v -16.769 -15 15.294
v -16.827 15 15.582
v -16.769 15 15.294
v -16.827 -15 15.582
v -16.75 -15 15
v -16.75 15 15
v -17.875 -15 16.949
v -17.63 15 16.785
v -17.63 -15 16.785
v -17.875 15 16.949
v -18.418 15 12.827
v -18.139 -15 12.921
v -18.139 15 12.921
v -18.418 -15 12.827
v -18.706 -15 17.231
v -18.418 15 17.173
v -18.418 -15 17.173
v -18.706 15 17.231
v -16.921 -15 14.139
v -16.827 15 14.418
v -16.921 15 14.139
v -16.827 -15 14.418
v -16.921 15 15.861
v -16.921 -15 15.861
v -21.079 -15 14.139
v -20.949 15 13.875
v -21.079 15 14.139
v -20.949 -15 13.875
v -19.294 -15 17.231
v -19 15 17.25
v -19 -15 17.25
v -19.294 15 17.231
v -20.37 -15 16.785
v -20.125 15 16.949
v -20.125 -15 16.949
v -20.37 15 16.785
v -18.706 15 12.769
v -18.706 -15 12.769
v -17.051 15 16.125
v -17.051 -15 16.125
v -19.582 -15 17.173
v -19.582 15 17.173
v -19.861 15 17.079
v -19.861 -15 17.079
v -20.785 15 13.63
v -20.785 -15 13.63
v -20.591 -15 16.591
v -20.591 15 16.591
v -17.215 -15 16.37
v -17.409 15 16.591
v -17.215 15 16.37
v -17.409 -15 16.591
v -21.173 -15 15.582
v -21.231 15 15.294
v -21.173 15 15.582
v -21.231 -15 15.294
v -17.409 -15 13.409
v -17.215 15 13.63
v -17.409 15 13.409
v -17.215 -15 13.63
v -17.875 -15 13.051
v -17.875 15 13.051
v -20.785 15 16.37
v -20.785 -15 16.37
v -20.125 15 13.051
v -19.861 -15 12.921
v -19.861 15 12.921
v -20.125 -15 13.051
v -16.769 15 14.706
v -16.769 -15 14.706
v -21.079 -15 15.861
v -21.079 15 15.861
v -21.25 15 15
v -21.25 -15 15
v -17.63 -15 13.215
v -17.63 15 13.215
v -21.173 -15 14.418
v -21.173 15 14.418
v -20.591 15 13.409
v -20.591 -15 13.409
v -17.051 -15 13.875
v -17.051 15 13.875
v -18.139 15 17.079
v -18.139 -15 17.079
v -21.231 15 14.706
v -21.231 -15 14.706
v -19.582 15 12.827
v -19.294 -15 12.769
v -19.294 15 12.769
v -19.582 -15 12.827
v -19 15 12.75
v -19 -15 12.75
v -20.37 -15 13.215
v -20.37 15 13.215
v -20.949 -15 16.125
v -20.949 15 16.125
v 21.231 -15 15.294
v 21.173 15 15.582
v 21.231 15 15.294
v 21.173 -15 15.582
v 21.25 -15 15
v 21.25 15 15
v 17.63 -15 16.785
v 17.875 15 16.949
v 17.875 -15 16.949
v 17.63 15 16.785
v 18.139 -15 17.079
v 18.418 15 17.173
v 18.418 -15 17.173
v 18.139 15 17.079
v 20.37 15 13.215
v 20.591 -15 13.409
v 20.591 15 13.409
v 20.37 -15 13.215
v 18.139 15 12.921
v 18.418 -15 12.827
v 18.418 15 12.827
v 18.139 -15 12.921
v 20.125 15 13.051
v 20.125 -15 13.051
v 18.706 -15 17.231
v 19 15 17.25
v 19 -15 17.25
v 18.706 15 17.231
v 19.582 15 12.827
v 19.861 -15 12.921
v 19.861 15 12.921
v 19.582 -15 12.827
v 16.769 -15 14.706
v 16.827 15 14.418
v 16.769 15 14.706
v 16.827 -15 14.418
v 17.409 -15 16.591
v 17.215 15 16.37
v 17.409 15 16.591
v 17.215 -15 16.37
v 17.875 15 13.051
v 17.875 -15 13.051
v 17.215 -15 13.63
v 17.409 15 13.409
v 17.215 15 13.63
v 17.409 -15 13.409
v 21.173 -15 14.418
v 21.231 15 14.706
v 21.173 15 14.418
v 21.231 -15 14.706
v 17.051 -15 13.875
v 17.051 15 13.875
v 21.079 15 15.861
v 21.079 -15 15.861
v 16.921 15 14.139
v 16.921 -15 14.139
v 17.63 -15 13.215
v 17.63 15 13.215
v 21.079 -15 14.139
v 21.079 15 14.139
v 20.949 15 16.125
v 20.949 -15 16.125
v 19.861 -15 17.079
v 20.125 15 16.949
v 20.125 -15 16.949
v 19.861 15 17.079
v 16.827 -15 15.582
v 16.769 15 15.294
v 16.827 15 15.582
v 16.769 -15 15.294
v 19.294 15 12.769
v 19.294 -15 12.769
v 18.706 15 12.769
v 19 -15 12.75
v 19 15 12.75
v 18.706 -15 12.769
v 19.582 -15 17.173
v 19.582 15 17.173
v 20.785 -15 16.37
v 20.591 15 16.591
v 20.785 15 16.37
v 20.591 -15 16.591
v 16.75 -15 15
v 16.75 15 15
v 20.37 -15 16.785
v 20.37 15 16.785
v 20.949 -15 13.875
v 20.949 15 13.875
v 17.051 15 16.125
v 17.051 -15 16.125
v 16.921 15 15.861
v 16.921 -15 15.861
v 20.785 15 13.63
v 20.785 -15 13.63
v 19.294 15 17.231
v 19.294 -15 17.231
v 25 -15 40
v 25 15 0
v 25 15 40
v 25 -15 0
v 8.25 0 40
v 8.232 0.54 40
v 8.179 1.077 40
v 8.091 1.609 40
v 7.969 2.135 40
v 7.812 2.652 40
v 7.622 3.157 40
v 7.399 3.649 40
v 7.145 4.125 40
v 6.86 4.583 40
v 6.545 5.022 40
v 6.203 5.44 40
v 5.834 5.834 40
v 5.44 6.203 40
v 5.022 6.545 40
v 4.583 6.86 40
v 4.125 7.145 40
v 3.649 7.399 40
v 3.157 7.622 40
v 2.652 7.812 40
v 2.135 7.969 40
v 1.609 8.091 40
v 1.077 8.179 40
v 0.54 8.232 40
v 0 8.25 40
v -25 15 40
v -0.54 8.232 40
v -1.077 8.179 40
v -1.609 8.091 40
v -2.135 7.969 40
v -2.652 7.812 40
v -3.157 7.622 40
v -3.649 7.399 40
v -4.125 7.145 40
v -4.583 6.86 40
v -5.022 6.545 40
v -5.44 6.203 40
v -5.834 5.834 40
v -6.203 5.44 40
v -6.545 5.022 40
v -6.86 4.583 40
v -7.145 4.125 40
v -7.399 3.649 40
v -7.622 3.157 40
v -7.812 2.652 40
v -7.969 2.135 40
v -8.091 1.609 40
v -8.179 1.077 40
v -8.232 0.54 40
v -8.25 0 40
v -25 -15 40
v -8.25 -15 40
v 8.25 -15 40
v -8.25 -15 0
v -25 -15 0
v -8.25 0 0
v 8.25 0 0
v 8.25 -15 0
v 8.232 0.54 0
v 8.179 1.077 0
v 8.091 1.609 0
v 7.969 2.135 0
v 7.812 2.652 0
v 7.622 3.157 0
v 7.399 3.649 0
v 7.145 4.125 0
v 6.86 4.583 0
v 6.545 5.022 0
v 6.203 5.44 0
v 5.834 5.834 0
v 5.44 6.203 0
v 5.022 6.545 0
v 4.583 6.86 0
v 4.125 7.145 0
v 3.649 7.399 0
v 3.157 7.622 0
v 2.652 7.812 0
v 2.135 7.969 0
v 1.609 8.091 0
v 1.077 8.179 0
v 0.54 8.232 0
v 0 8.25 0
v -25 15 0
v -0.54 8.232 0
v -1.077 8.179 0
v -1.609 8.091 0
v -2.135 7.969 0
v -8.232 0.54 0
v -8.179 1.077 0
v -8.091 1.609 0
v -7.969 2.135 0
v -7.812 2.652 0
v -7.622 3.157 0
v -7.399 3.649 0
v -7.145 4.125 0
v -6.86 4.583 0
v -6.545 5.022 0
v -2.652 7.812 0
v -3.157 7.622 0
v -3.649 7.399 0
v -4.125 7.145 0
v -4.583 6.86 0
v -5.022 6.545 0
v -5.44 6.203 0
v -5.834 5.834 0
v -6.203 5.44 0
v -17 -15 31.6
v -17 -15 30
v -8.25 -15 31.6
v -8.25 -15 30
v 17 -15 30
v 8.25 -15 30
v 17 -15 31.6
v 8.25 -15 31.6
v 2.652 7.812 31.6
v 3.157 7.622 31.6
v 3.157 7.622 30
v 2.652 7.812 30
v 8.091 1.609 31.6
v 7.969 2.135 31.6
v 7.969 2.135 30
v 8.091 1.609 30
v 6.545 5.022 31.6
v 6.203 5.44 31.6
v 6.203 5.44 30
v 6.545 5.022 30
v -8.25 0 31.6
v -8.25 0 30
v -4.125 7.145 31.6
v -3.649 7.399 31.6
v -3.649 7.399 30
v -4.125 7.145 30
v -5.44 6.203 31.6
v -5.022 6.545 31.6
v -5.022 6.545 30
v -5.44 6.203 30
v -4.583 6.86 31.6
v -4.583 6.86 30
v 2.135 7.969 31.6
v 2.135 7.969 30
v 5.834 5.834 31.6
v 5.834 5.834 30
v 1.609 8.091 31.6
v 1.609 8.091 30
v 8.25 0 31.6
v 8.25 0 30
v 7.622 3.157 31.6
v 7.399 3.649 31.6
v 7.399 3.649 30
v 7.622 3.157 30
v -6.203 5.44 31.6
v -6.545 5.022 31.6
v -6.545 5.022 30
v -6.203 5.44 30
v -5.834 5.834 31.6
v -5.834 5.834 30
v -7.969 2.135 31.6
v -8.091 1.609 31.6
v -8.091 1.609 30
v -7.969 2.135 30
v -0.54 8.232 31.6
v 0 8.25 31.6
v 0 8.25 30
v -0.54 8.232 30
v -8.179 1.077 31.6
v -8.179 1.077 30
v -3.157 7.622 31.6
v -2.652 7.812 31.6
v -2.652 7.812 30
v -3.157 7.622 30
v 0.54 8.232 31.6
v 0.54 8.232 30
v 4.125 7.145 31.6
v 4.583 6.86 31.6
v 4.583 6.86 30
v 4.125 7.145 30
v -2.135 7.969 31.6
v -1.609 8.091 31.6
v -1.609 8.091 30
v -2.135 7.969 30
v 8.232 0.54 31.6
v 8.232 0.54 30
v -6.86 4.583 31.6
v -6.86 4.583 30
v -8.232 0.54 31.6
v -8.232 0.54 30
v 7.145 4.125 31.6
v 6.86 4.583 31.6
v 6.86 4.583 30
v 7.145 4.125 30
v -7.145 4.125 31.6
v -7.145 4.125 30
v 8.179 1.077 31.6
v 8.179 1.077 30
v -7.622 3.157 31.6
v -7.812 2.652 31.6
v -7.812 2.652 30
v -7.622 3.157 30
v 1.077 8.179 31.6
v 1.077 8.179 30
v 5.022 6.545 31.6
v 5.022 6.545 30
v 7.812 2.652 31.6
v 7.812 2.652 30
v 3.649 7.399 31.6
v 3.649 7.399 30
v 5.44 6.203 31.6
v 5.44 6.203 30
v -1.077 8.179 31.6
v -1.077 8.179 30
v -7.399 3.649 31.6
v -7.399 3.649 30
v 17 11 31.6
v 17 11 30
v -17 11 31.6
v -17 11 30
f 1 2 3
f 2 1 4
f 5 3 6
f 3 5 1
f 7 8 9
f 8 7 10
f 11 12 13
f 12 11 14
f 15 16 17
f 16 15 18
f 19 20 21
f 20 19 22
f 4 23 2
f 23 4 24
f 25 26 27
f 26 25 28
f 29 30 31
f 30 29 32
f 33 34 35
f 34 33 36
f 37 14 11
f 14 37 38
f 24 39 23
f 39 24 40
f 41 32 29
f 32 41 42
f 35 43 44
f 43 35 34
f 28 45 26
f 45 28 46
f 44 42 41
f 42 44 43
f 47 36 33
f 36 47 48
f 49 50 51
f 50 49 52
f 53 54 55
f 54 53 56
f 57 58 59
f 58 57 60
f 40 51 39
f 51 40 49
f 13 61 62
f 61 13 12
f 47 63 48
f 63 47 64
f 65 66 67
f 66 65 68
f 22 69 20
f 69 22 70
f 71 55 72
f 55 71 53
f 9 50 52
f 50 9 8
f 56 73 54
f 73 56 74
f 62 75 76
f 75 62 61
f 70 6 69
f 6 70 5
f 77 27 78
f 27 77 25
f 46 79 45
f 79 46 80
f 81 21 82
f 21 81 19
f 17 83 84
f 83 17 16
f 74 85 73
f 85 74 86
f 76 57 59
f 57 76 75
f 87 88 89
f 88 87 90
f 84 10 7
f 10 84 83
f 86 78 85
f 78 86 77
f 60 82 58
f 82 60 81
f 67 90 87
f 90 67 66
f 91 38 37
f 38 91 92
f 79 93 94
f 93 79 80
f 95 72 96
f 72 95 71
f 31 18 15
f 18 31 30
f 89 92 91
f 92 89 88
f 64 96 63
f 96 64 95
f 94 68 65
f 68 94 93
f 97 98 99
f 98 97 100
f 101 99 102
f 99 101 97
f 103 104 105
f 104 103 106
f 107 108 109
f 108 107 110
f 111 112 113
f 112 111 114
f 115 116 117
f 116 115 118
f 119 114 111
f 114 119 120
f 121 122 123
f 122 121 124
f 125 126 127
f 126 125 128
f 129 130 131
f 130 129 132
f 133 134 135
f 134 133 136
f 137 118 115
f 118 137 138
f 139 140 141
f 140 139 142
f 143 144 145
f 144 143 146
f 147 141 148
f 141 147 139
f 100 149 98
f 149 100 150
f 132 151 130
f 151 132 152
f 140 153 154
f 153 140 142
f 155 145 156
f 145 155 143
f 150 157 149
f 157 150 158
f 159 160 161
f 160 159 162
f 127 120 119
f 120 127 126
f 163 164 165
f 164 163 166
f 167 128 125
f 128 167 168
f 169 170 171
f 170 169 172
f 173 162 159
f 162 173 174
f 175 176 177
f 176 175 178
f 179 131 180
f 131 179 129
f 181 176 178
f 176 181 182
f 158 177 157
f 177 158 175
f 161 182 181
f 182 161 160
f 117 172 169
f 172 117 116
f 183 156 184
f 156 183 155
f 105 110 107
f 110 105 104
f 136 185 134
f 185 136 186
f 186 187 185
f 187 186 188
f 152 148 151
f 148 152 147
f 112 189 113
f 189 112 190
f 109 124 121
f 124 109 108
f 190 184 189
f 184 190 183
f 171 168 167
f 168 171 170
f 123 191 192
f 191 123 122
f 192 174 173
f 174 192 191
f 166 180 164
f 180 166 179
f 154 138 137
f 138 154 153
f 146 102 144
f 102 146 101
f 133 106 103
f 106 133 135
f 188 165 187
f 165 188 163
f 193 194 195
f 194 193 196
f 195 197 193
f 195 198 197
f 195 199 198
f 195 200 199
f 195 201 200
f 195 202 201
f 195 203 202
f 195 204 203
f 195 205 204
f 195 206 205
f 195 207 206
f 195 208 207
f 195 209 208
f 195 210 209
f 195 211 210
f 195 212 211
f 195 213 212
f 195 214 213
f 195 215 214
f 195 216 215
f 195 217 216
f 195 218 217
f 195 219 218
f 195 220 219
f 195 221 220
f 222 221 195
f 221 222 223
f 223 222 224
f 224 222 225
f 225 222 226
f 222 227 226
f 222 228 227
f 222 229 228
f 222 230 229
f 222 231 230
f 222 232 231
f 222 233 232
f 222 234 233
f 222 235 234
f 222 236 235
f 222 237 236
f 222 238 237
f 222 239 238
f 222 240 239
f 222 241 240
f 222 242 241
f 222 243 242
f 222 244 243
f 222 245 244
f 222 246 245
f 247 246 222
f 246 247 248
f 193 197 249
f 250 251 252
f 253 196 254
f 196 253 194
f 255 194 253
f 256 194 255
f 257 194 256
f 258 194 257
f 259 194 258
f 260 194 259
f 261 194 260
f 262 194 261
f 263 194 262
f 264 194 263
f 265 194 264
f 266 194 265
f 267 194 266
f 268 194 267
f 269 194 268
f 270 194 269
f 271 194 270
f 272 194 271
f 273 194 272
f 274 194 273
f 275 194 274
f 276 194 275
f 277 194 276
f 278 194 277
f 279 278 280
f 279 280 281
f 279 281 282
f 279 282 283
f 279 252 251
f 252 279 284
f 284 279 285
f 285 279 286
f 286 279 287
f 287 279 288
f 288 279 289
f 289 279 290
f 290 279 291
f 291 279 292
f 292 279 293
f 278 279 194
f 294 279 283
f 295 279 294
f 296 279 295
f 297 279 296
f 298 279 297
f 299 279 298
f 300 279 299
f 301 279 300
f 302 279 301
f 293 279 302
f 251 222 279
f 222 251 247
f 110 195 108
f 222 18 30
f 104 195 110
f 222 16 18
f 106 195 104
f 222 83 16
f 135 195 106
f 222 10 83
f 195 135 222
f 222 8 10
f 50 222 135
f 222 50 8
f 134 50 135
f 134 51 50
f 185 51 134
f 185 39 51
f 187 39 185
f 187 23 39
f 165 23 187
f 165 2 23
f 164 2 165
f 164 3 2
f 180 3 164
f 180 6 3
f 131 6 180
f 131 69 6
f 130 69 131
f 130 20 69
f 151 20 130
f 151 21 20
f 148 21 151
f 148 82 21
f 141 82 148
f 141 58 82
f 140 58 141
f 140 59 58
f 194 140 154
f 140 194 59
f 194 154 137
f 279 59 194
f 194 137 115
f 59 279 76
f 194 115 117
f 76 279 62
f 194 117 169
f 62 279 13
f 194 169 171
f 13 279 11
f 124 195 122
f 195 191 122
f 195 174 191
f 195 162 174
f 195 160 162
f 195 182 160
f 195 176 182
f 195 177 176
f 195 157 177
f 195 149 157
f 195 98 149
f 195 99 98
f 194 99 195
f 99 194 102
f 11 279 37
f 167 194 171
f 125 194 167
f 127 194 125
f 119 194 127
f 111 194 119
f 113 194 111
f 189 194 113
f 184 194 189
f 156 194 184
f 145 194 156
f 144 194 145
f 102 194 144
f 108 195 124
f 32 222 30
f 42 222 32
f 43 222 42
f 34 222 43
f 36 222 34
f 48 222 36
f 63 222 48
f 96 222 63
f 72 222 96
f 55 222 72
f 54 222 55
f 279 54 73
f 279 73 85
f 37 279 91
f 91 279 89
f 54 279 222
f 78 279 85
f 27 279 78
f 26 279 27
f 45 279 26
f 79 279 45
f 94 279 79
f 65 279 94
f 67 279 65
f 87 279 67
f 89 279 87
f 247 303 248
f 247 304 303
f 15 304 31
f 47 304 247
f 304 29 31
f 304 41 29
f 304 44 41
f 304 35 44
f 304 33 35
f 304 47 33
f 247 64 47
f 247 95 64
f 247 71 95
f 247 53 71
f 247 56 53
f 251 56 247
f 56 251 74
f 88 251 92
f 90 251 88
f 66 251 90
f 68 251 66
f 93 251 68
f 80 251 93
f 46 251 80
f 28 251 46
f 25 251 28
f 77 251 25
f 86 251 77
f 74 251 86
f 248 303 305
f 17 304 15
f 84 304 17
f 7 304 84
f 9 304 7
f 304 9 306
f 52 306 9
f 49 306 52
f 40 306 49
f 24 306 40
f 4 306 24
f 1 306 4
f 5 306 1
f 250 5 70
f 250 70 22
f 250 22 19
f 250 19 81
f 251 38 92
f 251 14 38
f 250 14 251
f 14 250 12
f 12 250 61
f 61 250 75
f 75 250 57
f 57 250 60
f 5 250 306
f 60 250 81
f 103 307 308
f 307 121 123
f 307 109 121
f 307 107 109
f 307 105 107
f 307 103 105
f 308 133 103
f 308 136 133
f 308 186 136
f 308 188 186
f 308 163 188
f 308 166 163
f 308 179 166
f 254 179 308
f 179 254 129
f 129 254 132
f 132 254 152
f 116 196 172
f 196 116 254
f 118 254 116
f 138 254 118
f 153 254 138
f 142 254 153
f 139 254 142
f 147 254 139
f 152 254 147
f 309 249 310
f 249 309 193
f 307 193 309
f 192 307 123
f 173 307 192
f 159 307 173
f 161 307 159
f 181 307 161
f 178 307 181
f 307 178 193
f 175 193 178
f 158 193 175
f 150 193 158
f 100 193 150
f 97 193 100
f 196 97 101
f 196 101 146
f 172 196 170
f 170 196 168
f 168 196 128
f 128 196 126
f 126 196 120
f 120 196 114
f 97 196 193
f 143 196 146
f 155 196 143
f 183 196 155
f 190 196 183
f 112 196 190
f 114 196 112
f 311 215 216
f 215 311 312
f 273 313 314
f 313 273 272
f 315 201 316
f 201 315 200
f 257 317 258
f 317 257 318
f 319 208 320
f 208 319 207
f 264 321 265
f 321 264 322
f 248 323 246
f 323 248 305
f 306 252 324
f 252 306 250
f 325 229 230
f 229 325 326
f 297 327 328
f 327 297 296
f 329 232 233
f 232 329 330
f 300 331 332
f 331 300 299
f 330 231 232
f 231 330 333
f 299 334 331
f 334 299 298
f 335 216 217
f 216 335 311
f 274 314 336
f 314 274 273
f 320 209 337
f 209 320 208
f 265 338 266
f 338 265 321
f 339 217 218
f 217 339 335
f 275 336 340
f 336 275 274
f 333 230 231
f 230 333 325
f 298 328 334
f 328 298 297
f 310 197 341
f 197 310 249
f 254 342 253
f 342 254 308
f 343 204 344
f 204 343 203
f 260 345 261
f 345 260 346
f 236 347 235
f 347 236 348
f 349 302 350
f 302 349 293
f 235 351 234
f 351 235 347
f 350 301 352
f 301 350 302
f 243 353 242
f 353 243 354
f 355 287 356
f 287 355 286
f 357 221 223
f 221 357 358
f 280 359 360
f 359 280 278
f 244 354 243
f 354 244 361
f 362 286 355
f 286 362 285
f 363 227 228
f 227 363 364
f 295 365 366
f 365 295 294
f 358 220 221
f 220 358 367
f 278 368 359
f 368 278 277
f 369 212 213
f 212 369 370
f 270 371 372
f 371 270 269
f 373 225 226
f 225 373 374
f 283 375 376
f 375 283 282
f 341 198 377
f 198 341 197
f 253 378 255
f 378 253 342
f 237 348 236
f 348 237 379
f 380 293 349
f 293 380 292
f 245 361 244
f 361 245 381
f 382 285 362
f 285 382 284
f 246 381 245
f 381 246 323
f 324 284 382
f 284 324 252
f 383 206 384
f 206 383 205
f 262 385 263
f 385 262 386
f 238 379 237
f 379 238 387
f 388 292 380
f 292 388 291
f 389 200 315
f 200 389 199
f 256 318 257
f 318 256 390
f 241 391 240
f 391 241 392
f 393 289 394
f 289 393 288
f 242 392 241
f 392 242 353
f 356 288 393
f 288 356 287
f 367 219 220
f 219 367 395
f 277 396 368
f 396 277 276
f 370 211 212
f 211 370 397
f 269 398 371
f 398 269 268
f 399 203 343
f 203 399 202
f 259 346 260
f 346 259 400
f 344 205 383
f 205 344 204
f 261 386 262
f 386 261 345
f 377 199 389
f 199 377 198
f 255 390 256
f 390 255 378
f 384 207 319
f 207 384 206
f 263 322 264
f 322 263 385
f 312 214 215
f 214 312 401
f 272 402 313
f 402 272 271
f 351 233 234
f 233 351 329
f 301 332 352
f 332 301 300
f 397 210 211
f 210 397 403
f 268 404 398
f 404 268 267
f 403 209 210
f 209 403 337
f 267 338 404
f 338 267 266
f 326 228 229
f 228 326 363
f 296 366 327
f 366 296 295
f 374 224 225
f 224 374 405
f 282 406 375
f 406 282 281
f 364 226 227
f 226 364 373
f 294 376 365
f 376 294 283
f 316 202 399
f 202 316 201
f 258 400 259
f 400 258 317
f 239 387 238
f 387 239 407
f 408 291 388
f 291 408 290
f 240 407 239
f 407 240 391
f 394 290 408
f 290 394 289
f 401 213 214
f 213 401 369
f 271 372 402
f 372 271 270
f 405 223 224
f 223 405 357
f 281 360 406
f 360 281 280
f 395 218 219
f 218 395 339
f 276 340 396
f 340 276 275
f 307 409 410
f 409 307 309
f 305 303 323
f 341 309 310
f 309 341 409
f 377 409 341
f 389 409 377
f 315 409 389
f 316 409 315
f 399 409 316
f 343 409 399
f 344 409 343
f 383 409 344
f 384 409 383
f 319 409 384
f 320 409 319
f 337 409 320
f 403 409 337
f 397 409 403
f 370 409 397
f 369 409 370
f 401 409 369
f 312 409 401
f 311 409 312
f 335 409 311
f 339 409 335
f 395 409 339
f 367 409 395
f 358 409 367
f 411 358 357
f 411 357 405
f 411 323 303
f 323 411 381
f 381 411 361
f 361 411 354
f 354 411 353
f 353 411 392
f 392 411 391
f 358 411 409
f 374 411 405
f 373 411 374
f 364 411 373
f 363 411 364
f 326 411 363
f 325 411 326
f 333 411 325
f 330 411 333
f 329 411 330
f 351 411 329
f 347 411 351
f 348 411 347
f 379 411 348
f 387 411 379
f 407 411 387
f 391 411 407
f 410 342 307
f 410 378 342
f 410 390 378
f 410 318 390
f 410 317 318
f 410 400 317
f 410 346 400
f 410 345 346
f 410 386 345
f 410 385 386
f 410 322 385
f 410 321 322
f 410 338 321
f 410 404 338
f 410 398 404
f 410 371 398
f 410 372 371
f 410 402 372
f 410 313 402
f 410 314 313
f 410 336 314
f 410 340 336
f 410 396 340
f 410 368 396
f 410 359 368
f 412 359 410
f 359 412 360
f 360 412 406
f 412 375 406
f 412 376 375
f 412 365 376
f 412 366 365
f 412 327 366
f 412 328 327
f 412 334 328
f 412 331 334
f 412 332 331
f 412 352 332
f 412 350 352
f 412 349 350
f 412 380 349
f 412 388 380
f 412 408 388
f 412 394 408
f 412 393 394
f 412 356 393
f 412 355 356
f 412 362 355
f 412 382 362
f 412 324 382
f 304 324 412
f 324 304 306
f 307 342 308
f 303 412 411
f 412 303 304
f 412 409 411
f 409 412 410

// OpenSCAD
// KNOWN-WRONG PART (must fail): the flange slot is 1.6 mm tall instead of 2.6
// Wall-mounted holder for a 10 mL syringe hanging upright, tip down (gravity-feed reservoir)
// Category: hardware. A block with a vertical U-shaped barrel channel open at the front, a
// horizontal slot that takes the finger flange, and two M4 wall-screw holes from front to back.
// Print: PETG or PLA, standing on its bottom face; the flange slot roof bridges 34 mm.
// SPDX-License-Identifier: CERN-OHL-P-2.0

/* [Holder] */
block = [50, 30, 40];     // X (width), Y (depth), Z (height) [mm]; back face at y = +15
channel_w = 16.5;         // 16 mm barrel + clearance; half-circle back end centred at (0, 0)
slot = [34, 1.6];         // flange slot width (X) and height (Z)
slot_z = 30;              // slot from z = 30 to 32.6
slot_back_y = 11;         // the slot reaches from the front face back to y = 11
screw_d = 4.5;            // M4 clearance
screw_x = 19;
screw_z = 15;

/* [Hidden] */
eps = 0.01;

difference() {
    translate([-block.x / 2, -block.y / 2, 0]) cube(block);
    // barrel channel, open toward -Y (the front)
    translate([0, 0, -1]) linear_extrude(block.z + 2) {
        circle(d = channel_w, $fn = 96);
        translate([-channel_w / 2, -block.y / 2 - 1]) square([channel_w, block.y / 2 + 1]);
    }
    // flange slot, cut in from the front face
    translate([-slot.x / 2, -block.y / 2 - 1, slot_z]) cube([slot.x, slot_back_y + block.y / 2 + 1, slot.y]);
    // wall-screw holes, front to back
    for (s = [-1, 1])
        translate([s * screw_x, 0, screw_z]) rotate([90, 0, 0])
            cylinder(d = screw_d, h = block.y + 2, center = true, $fn = 48);
}
